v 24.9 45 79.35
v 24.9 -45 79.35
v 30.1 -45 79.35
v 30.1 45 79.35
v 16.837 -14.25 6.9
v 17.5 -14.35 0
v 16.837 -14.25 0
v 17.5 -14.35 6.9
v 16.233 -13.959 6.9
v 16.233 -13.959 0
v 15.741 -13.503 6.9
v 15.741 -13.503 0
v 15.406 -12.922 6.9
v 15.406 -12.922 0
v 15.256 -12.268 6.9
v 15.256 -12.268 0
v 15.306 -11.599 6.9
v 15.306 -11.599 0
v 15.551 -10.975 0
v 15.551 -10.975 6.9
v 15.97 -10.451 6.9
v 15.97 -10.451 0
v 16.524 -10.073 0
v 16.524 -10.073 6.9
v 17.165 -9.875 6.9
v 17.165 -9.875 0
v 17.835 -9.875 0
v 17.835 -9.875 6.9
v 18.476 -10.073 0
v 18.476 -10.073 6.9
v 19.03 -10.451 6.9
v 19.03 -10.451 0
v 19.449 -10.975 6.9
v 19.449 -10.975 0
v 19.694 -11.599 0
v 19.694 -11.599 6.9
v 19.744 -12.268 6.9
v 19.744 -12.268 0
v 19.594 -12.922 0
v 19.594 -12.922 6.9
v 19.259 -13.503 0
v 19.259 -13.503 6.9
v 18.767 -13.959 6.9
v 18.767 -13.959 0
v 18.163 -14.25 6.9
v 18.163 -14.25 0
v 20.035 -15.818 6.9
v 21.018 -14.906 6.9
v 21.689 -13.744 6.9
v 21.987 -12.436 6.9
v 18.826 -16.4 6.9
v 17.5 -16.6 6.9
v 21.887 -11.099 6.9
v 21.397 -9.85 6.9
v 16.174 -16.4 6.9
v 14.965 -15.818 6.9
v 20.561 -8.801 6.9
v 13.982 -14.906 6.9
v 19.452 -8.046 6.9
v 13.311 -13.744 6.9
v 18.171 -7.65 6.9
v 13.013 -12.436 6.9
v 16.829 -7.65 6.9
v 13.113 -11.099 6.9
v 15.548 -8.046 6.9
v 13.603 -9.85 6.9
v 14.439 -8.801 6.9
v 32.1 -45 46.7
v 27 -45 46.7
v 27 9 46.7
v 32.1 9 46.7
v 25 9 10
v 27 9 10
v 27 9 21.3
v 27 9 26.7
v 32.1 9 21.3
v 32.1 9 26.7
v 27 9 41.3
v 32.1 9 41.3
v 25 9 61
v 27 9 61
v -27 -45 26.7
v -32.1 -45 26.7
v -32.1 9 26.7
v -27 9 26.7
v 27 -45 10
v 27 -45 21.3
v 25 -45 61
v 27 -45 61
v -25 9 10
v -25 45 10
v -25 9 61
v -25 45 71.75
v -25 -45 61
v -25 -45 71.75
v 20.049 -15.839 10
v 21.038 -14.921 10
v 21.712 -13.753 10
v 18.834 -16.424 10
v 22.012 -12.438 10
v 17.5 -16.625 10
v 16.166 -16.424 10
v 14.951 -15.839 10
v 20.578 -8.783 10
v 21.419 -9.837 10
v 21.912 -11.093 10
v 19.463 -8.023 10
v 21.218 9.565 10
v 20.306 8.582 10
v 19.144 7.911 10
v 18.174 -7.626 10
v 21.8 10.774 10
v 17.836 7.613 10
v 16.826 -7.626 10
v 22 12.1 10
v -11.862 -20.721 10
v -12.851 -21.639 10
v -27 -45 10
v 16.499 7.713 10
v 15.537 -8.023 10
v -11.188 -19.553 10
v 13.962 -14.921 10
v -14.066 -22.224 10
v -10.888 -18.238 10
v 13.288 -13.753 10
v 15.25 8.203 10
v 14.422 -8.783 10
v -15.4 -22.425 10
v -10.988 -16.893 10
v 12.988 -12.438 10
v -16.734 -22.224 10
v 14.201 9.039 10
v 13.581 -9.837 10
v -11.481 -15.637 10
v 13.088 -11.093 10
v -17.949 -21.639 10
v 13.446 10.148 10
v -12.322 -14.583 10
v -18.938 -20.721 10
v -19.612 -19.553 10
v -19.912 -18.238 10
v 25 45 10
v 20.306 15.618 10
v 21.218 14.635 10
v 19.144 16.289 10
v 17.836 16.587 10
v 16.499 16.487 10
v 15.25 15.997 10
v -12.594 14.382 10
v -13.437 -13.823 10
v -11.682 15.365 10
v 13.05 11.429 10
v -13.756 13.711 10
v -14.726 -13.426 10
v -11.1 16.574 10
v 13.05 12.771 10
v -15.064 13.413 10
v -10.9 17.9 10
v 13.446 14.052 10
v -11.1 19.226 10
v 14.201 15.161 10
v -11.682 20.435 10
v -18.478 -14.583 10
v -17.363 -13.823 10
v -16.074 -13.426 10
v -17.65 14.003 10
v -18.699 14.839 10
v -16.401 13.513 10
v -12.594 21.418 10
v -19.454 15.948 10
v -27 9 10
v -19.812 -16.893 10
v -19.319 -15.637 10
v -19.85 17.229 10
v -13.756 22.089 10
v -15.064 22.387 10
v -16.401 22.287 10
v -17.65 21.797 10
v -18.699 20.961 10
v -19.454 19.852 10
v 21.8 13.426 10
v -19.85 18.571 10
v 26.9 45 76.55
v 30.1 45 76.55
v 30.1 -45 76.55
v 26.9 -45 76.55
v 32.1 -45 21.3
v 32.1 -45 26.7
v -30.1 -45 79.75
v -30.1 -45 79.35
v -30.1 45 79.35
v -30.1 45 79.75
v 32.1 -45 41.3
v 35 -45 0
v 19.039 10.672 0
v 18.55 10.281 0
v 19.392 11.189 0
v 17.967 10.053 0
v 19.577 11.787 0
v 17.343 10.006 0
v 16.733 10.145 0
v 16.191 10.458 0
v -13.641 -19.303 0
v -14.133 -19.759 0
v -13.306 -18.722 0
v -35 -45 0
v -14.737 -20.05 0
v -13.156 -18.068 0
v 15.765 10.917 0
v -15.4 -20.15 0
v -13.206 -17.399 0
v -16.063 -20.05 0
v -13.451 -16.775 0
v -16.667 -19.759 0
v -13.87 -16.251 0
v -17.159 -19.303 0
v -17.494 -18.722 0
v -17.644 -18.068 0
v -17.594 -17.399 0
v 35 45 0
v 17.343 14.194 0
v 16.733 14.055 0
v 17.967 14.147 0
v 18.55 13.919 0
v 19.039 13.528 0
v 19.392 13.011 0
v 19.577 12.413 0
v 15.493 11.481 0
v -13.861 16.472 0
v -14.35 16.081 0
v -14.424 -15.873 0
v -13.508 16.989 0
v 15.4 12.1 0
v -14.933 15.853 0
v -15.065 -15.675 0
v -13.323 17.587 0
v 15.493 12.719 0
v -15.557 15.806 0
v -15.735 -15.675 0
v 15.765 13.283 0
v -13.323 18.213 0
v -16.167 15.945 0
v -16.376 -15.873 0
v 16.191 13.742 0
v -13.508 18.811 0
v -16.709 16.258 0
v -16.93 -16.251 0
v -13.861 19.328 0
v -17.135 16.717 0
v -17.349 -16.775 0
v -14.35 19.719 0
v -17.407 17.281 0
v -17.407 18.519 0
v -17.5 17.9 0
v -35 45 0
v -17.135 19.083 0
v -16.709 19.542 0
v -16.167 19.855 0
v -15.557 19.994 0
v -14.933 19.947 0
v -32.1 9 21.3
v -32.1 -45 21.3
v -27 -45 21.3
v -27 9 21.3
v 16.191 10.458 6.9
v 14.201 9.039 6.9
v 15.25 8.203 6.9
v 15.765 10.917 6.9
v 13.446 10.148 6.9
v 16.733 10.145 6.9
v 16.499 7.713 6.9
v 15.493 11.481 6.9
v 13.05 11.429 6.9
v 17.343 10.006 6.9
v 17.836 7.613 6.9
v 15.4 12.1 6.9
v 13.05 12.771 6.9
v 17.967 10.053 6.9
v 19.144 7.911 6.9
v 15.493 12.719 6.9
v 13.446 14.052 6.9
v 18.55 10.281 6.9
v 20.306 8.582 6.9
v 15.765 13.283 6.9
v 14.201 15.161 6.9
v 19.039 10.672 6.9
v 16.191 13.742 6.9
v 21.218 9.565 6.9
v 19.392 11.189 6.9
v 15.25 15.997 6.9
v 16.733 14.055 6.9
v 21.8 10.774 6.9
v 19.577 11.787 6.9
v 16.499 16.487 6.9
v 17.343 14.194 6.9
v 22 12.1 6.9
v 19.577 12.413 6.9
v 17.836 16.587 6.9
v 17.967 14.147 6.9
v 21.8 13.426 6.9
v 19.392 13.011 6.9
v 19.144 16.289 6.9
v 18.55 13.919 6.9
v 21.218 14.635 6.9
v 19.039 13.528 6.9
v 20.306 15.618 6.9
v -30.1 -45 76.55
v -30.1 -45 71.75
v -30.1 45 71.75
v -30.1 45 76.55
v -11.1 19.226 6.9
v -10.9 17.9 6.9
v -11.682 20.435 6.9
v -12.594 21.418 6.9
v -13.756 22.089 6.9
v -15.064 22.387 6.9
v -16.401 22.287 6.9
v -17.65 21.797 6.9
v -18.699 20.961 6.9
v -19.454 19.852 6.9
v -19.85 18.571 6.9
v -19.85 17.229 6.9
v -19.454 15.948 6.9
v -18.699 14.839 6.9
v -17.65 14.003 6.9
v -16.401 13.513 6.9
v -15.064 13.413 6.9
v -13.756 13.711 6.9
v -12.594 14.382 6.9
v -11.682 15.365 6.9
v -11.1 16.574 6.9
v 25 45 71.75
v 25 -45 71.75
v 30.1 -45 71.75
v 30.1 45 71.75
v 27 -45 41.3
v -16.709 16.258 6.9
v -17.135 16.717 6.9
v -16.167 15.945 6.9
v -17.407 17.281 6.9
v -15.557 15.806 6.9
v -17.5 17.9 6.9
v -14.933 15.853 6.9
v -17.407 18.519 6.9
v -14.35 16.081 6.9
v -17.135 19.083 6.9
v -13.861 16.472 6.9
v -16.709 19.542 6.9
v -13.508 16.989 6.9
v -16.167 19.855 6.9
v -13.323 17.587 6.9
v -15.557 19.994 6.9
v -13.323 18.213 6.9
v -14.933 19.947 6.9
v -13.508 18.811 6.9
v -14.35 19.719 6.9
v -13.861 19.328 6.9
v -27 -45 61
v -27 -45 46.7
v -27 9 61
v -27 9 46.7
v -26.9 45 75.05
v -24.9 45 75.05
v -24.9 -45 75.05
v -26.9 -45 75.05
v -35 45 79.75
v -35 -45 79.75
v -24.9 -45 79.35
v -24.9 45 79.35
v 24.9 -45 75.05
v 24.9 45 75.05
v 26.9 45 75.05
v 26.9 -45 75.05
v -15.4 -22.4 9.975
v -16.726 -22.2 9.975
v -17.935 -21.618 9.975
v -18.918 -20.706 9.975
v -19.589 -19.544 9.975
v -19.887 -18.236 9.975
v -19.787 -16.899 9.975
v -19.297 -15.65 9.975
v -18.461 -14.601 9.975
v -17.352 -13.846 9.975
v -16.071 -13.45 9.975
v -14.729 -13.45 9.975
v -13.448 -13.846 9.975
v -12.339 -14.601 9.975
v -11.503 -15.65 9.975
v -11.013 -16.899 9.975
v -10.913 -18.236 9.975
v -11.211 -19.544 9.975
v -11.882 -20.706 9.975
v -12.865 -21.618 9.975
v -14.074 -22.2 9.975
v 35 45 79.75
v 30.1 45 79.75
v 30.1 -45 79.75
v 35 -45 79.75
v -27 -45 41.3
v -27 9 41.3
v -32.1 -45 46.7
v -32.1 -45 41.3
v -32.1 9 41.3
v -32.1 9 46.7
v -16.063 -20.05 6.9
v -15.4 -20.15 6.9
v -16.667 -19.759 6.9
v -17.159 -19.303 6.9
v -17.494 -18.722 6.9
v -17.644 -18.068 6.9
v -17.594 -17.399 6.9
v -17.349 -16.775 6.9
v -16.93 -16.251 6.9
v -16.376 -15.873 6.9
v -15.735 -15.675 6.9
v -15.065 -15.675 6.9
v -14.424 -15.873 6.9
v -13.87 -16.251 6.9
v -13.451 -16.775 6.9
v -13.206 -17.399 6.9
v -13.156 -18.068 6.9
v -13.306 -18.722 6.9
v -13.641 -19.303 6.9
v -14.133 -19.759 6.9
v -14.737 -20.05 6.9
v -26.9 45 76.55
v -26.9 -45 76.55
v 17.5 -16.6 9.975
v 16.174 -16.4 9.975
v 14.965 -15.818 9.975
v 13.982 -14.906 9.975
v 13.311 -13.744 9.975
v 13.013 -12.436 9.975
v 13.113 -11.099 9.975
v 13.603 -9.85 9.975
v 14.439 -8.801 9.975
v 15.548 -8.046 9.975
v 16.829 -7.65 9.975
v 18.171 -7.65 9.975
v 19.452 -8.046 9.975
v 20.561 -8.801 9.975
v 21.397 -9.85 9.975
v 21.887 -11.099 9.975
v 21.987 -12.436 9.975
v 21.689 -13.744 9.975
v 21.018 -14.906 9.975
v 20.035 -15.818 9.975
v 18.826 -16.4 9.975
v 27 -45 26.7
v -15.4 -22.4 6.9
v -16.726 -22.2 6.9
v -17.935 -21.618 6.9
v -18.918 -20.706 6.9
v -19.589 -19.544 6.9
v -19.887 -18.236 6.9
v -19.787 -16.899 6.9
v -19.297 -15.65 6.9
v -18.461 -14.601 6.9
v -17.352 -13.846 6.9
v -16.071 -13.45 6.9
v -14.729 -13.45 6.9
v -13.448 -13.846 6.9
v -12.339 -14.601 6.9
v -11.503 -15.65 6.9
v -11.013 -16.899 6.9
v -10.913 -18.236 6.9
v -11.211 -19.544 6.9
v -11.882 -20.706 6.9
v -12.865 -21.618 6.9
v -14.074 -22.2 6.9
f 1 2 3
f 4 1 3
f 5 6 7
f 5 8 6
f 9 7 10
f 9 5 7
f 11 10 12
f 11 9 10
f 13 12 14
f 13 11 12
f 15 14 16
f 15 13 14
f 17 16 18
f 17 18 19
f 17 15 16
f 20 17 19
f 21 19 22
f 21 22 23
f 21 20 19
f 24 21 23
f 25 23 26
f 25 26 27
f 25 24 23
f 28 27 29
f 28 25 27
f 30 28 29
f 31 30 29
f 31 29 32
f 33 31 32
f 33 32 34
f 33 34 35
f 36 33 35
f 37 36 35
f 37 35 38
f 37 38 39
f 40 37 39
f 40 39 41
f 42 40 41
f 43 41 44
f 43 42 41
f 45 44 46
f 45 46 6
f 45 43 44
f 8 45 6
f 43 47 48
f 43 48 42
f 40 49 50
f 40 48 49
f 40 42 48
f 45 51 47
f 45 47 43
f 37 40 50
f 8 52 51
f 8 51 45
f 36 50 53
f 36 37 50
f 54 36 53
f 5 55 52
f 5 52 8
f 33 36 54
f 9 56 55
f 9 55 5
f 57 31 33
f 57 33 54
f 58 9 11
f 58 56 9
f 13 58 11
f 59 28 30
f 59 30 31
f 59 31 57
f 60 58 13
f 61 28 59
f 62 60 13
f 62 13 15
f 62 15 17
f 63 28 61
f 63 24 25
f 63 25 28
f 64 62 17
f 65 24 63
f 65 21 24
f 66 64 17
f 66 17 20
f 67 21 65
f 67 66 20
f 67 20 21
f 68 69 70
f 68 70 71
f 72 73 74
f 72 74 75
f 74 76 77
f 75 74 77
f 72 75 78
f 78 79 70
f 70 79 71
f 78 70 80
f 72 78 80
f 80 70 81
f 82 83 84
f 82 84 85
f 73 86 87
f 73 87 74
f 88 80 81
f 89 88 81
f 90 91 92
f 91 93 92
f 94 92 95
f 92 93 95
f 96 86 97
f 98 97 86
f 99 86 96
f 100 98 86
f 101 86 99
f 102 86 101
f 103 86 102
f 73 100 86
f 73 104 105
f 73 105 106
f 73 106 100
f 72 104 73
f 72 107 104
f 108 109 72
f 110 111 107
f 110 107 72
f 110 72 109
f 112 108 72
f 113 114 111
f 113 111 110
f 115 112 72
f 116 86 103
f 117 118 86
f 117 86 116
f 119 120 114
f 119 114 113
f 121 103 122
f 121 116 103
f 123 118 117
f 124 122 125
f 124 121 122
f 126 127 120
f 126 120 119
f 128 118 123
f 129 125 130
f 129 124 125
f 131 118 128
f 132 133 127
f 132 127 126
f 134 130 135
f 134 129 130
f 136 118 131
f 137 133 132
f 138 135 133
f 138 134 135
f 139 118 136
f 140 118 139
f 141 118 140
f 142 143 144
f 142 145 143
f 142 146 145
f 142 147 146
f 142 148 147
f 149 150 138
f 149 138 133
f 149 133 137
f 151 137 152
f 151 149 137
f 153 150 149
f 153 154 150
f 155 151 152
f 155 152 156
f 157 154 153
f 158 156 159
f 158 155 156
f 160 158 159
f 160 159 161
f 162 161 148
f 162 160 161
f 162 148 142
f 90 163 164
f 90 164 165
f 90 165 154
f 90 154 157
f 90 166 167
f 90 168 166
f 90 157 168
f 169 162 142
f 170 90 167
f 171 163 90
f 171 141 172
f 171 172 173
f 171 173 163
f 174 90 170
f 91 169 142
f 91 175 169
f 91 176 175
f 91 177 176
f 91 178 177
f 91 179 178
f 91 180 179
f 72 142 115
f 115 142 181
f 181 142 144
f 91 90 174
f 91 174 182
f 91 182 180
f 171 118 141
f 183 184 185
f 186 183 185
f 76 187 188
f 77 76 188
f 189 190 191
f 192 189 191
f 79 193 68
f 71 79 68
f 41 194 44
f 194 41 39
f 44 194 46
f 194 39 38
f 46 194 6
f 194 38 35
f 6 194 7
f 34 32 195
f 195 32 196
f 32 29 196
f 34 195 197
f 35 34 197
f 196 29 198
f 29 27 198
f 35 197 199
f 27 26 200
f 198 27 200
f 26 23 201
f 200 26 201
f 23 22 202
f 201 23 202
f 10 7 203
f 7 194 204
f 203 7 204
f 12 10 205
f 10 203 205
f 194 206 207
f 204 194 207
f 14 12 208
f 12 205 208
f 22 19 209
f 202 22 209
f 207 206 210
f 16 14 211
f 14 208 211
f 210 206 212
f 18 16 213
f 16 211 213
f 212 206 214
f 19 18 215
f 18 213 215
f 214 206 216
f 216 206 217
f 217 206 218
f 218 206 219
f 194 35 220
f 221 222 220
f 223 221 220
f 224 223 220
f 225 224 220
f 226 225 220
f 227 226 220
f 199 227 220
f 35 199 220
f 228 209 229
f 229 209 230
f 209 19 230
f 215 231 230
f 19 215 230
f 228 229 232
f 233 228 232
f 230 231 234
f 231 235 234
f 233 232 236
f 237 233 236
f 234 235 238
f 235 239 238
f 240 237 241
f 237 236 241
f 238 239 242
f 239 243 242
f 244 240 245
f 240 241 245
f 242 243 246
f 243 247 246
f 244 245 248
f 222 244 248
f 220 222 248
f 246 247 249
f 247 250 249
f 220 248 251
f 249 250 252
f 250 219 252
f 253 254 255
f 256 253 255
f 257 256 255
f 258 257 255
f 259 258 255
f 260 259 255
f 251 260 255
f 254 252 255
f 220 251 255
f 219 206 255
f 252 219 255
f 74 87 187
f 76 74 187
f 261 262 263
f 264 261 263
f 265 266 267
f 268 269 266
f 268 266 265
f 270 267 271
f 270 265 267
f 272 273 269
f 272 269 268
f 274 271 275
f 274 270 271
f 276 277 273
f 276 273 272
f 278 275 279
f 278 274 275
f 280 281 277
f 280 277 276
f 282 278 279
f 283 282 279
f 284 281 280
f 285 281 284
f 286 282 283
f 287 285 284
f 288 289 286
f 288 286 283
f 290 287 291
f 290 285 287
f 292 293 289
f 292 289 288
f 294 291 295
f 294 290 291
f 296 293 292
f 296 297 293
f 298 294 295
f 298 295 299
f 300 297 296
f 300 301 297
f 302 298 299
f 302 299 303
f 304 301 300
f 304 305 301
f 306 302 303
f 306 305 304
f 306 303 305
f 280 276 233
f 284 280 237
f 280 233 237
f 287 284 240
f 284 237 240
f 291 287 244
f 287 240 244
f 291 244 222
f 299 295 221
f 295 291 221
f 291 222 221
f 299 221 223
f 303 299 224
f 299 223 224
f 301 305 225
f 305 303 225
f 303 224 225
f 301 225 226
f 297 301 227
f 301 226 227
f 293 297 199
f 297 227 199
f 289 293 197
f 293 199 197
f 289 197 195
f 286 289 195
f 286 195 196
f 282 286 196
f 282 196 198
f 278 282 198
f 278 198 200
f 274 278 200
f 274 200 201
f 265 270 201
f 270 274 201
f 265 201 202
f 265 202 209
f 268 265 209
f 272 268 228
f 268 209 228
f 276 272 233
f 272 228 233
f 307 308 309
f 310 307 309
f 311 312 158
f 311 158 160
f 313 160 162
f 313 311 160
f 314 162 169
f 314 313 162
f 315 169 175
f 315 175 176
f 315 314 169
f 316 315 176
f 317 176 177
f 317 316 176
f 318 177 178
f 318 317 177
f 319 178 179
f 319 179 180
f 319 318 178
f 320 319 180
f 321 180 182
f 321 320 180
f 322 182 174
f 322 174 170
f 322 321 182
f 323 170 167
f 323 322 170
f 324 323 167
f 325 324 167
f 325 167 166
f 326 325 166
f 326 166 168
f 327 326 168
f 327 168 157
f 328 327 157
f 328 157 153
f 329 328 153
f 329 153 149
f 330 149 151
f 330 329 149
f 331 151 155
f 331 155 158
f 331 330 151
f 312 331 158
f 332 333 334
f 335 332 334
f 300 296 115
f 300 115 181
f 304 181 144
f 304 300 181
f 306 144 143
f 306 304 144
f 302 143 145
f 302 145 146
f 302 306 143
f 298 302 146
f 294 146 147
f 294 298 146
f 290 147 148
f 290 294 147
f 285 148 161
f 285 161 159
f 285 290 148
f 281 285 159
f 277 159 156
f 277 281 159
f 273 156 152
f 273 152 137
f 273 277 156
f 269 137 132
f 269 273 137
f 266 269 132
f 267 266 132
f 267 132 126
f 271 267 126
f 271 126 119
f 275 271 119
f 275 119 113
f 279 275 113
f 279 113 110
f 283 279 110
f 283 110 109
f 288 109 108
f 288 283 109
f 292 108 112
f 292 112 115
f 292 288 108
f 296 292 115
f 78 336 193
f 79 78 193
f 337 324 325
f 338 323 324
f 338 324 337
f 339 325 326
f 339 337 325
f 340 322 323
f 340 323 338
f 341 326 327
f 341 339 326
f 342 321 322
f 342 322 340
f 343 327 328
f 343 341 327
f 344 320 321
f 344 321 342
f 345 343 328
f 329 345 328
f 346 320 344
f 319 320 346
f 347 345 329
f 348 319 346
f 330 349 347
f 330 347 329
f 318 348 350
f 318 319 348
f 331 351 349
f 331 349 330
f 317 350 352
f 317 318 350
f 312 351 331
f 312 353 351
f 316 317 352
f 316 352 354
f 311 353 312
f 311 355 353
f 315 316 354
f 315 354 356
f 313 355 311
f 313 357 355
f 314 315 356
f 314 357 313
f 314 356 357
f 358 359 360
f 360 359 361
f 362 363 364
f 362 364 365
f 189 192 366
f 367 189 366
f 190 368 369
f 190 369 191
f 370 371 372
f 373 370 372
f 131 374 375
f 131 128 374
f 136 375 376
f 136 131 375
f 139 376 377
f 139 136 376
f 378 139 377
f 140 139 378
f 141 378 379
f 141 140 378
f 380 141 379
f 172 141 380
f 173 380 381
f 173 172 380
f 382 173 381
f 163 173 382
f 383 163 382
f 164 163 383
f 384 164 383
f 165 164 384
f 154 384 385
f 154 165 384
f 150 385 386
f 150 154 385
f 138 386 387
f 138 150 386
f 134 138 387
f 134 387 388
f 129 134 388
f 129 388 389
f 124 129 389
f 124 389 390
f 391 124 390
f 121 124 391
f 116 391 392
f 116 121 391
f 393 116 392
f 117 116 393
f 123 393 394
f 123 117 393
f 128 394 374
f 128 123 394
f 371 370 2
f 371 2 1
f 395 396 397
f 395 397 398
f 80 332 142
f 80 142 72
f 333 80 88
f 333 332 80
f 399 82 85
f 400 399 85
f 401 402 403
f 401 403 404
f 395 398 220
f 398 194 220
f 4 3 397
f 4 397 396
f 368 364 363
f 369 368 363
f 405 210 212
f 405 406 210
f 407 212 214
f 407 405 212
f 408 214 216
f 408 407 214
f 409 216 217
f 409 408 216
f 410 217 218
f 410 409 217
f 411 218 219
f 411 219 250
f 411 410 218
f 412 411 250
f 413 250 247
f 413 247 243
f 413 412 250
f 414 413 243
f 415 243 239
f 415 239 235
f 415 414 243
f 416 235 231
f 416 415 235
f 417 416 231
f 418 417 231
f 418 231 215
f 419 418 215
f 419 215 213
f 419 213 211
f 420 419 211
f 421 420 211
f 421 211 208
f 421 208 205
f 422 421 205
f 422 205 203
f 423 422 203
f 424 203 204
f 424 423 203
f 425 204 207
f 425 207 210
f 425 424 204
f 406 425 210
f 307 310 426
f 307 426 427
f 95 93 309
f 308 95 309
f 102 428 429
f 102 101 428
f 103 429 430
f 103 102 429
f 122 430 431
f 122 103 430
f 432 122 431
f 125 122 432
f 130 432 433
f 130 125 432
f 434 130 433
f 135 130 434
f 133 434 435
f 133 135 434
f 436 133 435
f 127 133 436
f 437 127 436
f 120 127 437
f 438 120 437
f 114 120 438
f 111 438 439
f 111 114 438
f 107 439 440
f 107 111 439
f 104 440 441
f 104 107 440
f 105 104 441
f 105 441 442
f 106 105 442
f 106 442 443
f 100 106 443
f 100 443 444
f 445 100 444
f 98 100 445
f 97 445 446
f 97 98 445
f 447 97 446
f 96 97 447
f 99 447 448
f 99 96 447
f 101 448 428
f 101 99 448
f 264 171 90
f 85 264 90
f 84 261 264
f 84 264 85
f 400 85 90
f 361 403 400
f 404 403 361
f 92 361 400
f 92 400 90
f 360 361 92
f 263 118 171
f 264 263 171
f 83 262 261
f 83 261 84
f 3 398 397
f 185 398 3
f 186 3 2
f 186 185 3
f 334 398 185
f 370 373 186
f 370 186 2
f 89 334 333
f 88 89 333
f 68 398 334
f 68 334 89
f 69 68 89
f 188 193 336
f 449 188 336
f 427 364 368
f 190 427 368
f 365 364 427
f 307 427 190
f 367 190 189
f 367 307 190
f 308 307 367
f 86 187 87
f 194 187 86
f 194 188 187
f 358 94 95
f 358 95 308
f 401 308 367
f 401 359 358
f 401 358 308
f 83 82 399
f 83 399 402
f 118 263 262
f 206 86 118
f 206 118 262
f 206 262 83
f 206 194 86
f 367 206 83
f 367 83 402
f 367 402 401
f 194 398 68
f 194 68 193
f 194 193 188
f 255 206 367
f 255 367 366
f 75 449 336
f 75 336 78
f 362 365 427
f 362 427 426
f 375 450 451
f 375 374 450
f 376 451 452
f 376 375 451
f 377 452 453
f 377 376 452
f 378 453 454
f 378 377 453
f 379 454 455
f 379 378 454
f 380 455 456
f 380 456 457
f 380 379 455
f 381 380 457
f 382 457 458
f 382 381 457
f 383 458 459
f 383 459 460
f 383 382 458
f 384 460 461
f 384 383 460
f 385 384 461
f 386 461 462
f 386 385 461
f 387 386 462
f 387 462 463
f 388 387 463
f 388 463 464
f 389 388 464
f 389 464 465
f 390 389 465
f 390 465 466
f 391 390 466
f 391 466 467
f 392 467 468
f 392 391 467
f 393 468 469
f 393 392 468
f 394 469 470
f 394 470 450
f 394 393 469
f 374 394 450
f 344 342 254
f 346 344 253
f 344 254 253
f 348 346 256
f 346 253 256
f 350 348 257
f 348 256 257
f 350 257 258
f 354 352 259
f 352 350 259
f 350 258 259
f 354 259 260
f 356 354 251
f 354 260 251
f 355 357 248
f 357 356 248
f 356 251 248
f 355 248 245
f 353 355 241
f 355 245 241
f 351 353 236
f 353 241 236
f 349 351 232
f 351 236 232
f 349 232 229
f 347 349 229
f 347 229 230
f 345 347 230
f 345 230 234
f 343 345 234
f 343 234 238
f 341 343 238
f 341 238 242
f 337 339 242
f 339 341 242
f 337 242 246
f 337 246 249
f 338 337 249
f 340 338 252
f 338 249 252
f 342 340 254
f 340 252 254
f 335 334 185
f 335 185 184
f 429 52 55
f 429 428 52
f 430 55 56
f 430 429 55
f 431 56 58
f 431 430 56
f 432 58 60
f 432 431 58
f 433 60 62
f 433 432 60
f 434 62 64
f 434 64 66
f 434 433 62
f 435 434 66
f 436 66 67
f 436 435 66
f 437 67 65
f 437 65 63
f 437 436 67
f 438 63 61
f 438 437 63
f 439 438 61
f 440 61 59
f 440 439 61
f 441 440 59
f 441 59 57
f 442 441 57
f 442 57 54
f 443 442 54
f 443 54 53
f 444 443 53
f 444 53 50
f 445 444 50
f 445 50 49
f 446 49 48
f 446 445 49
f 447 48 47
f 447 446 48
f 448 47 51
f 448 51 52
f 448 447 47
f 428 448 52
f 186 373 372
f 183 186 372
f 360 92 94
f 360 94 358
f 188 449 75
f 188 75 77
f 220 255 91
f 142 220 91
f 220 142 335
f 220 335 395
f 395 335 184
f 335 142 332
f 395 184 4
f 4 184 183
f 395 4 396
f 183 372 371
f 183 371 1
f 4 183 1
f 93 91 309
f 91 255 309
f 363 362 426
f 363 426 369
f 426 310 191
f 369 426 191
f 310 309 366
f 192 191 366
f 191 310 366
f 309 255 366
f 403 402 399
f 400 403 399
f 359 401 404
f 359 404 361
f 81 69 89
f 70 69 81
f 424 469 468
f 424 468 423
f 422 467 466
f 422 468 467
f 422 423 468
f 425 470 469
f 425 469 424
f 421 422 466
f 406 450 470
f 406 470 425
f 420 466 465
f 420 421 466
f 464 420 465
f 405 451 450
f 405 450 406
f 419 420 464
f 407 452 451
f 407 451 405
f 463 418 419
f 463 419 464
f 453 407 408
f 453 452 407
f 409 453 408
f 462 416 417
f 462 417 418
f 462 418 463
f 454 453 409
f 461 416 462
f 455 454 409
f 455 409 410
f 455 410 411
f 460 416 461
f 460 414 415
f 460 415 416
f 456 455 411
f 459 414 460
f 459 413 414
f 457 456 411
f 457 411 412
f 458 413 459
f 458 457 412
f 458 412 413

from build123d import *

# Parameters (mm, degrees)
SKETCH1_W                                     = 90
SKETCH1_H                                     = 70
BOSS_EXTRUDE1_DEPTH                           = 10
SKETCH2_W                                     = 8
SKETCH2_H                                     = 90
BOSS_EXTRUDE2_DEPTH                           = 51
SKETCH3_W                                     = 5.1
SKETCH3_H                                     = 5.4
CUT_EXTRUDE1_DEPTH                            = 54
SKETCH14_W                                    = 10
SKETCH14_H                                    = 90
BOSS_EXTRUDE6_DEPTH                           = 11.75
SKETCH15_W                                    = 4.9
SKETCH15_H                                    = 90
BOSS_EXTRUDE7_DEPTH                           = 7
SKETCH17_W                                    = 90
SKETCH17_H                                    = 2.8
BOSS_EXTRUDE8_DEPTH                           = 5
SKETCH16_W                                    = 5.1
SKETCH16_H                                    = 90
CUT_EXTRUDE3_DEPTH                            = 1
BOSS_EXTRUDE9_START                           = -1.5
SKETCH18_W                                    = 2
SKETCH18_H                                    = 90
BOSS_EXTRUDE9_DEPTH                           = 4.3
SKETCH43_W                                    = 36
SKETCH43_H                                    = 51
BOSS_EXTRUDE10_DEPTH                          = 2
SKETCH21_R                                    = 2.1
CUT_EXTRUDE7_DEPTH                            = 99.030926243
CBORE_FOR_M4_PAN_HEAD_MACHINE_SCREW4_AT_COUNT = 2
CBORE_FOR_M4_PAN_HEAD_MACHINE_SCREW4_AT_PITCH = 33.407334524
ADVANCEDHOLE1_START                           = 6.9
ADVANCEDHOLE1_OUTLINE_R                       = 4.5
ADVANCEDHOLE1_OUTLINE_R_2                     = 2.1
ADVANCEDHOLE1_DEPTH                           = 3.1


# Read off the part's stored shape, not the designer's step: AdvancedHole1
with BuildPart() as part:
    # Sketch1 → Boss-Extrude1 (new body)
    with BuildSketch(Plane(origin=(0, 0, 0), x_dir=(0, 1, 0), z_dir=(0, 0, 1))):
        Rectangle(SKETCH1_W, SKETCH1_H)
    extrude(amount=BOSS_EXTRUDE1_DEPTH)

    # Sketch2 → Boss-Extrude2 (add)
    with BuildSketch(Plane.XY.offset(10)):
        with Locations((-31, 0)):
            Rectangle(SKETCH2_W, SKETCH2_H)
        with Locations((31, 0)):
            Rectangle(SKETCH2_W, SKETCH2_H)
    extrude(amount=BOSS_EXTRUDE2_DEPTH)

    # Sketch3 → Cut-Extrude1 (cut)
    with BuildSketch(Plane.XZ.offset(45)):
        with Locations((-29.55, 24)):
            Rectangle(SKETCH3_W, SKETCH3_H)
        with Locations((-29.55, 44)):
            Rectangle(SKETCH3_W, SKETCH3_H)
        with Locations((29.55, 24)):
            Rectangle(SKETCH3_W, SKETCH3_H)
        with Locations((29.55, 44)):
            Rectangle(SKETCH3_W, SKETCH3_H)
    extrude(amount=-CUT_EXTRUDE1_DEPTH, mode=Mode.SUBTRACT)

    # Sketch14 → Boss-Extrude6 (add)
    with BuildSketch(Plane.XY.offset(61)):
        with Locations((30, 0)):
            Rectangle(SKETCH14_W, SKETCH14_H)
    boss_extrude6 = extrude(amount=BOSS_EXTRUDE6_DEPTH)

    # Sketch15 → Boss-Extrude7 (add)
    with BuildSketch(Plane.XY.offset(72.75)):
        with Locations((32.55, 0)):
            Rectangle(SKETCH15_W, SKETCH15_H)
    boss_extrude7 = extrude(amount=BOSS_EXTRUDE7_DEPTH)

    # Sketch17 → Boss-Extrude8 (add)
    with BuildSketch(Plane(origin=(30.1, 0, 0), x_dir=(0, -1, 0), z_dir=(-1, 0, 0))):
        with Locations((0, 77.95)):
            Rectangle(SKETCH17_W, SKETCH17_H)
    boss_extrude8 = extrude(amount=BOSS_EXTRUDE8_DEPTH)

    # Sketch16 → Cut-Extrude3 (cut)
    with BuildSketch(Plane.XY.offset(72.75)):
        with Locations((27.55, 0)):
            Rectangle(SKETCH16_W, SKETCH16_H)
    cut_extrude3 = extrude(amount=-CUT_EXTRUDE3_DEPTH, mode=Mode.SUBTRACT)

    # Sketch18 → Boss-Extrude9 (add)
    with BuildSketch(Plane.XY.offset(76.55).offset(BOSS_EXTRUDE9_START)):
        with Locations((25.9, 0)):
            Rectangle(SKETCH18_W, SKETCH18_H)
    boss_extrude9 = extrude(amount=BOSS_EXTRUDE9_DEPTH)

    # Sketch43 → Boss-Extrude10 (add)
    with BuildSketch(Plane(origin=(27, 0, 0), x_dir=(0, -1, 0), z_dir=(-1, 0, 0))):
        with Locations((-27, 35.5)):
            Rectangle(SKETCH43_W, SKETCH43_H)
    boss_extrude10 = extrude(amount=BOSS_EXTRUDE10_DEPTH)

    # Mirror2: Boss-Extrude6, Boss-Extrude7, Boss-Extrude8, Cut-Extrude3, Boss-Extrude9, Boss-Extrude10 across plane
    add(boss_extrude6.mirror(Plane(origin=(0, 0, 0), x_dir=(0, 0, 1), z_dir=(1, 0, 0))))
    add(boss_extrude7.mirror(Plane(origin=(0, 0, 0), x_dir=(0, 0, 1), z_dir=(1, 0, 0))))
    add(boss_extrude8.mirror(Plane(origin=(0, 0, 0), x_dir=(0, 0, 1), z_dir=(1, 0, 0))))
    add(cut_extrude3.mirror(Plane(origin=(0, 0, 0), x_dir=(0, 0, 1), z_dir=(1, 0, 0))), mode=Mode.SUBTRACT)
    add(boss_extrude9.mirror(Plane(origin=(0, 0, 0), x_dir=(0, 0, 1), z_dir=(1, 0, 0))))
    add(boss_extrude10.mirror(Plane(origin=(0, 0, 0), x_dir=(0, 0, 1), z_dir=(1, 0, 0))))

    # Sketch21 → Cut-Extrude7 (cut, through all)
    with BuildSketch(Plane(origin=(0, 0, 0), x_dir=(1, 0, 0), z_dir=(0, 0, -1))):
        with Locations((17.5, 12.1)):
            Circle(SKETCH21_R)
        with Locations(Location((17.5, -12.1, 0), (0, 0, 180))):
            Circle(SKETCH21_R)
        with Locations(Location((-15.4, -17.9, 0), (0, 0, 180))):
            Circle(SKETCH21_R)
        with Locations((-15.4, 17.9)):
            Circle(SKETCH21_R)
    extrude(amount=-CUT_EXTRUDE7_DEPTH, mode=Mode.SUBTRACT)

    # Sketch30 → CBORE for M4 Pan Head Machine Screw4 (revolve, cut)
    with BuildSketch(Plane(origin=(17.5, -12.1, 10), x_dir=(0, -1, 0), z_dir=(1, 0, 0))):
        Polygon((0, 0), (0, 10), (2.25, 10), (2.25, 3.1), (4.5, 3.1), (4.5, 0.025), (4.525, 0), align=None)
    cbore_for_m4_pan_head_machine_screw4 = revolve(axis=Axis((17.5, -12.1, 16.35), (0, 0, -1)), mode=Mode.SUBTRACT)

    # CBORE for M4 Pan Head Machine Screw4 at: CBORE for M4 Pan Head Machine Screw4 ×2
    with Locations(*[Vector(-0.9848136784555953, -0.1736145694541778, 0) * (i * CBORE_FOR_M4_PAN_HEAD_MACHINE_SCREW4_AT_PITCH) for i in range(1, CBORE_FOR_M4_PAN_HEAD_MACHINE_SCREW4_AT_COUNT)]):
        add(cbore_for_m4_pan_head_machine_screw4, mode=Mode.SUBTRACT)

    # AdvancedHole1 outline → AdvancedHole1 (cut)
    # profile 1 of 2: a face of its own
    with BuildSketch(Plane.XY.offset(ADVANCEDHOLE1_START)):
        with Locations((17.5, 12.1)):
            Circle(ADVANCEDHOLE1_OUTLINE_R)
        with Locations((17.5, 12.1)):
            Circle(ADVANCEDHOLE1_OUTLINE_R_2, mode=Mode.SUBTRACT)
    # profile 2 of 2: a face of its own
    with BuildSketch(Plane.XY.offset(ADVANCEDHOLE1_START)):
        with Locations((-15.4, 17.9)):
            Circle(ADVANCEDHOLE1_OUTLINE_R)
        with Locations((-15.4, 17.9)):
            Circle(ADVANCEDHOLE1_OUTLINE_R_2, mode=Mode.SUBTRACT)
    extrude(amount=ADVANCEDHOLE1_DEPTH, mode=Mode.SUBTRACT)


solid = part.part
